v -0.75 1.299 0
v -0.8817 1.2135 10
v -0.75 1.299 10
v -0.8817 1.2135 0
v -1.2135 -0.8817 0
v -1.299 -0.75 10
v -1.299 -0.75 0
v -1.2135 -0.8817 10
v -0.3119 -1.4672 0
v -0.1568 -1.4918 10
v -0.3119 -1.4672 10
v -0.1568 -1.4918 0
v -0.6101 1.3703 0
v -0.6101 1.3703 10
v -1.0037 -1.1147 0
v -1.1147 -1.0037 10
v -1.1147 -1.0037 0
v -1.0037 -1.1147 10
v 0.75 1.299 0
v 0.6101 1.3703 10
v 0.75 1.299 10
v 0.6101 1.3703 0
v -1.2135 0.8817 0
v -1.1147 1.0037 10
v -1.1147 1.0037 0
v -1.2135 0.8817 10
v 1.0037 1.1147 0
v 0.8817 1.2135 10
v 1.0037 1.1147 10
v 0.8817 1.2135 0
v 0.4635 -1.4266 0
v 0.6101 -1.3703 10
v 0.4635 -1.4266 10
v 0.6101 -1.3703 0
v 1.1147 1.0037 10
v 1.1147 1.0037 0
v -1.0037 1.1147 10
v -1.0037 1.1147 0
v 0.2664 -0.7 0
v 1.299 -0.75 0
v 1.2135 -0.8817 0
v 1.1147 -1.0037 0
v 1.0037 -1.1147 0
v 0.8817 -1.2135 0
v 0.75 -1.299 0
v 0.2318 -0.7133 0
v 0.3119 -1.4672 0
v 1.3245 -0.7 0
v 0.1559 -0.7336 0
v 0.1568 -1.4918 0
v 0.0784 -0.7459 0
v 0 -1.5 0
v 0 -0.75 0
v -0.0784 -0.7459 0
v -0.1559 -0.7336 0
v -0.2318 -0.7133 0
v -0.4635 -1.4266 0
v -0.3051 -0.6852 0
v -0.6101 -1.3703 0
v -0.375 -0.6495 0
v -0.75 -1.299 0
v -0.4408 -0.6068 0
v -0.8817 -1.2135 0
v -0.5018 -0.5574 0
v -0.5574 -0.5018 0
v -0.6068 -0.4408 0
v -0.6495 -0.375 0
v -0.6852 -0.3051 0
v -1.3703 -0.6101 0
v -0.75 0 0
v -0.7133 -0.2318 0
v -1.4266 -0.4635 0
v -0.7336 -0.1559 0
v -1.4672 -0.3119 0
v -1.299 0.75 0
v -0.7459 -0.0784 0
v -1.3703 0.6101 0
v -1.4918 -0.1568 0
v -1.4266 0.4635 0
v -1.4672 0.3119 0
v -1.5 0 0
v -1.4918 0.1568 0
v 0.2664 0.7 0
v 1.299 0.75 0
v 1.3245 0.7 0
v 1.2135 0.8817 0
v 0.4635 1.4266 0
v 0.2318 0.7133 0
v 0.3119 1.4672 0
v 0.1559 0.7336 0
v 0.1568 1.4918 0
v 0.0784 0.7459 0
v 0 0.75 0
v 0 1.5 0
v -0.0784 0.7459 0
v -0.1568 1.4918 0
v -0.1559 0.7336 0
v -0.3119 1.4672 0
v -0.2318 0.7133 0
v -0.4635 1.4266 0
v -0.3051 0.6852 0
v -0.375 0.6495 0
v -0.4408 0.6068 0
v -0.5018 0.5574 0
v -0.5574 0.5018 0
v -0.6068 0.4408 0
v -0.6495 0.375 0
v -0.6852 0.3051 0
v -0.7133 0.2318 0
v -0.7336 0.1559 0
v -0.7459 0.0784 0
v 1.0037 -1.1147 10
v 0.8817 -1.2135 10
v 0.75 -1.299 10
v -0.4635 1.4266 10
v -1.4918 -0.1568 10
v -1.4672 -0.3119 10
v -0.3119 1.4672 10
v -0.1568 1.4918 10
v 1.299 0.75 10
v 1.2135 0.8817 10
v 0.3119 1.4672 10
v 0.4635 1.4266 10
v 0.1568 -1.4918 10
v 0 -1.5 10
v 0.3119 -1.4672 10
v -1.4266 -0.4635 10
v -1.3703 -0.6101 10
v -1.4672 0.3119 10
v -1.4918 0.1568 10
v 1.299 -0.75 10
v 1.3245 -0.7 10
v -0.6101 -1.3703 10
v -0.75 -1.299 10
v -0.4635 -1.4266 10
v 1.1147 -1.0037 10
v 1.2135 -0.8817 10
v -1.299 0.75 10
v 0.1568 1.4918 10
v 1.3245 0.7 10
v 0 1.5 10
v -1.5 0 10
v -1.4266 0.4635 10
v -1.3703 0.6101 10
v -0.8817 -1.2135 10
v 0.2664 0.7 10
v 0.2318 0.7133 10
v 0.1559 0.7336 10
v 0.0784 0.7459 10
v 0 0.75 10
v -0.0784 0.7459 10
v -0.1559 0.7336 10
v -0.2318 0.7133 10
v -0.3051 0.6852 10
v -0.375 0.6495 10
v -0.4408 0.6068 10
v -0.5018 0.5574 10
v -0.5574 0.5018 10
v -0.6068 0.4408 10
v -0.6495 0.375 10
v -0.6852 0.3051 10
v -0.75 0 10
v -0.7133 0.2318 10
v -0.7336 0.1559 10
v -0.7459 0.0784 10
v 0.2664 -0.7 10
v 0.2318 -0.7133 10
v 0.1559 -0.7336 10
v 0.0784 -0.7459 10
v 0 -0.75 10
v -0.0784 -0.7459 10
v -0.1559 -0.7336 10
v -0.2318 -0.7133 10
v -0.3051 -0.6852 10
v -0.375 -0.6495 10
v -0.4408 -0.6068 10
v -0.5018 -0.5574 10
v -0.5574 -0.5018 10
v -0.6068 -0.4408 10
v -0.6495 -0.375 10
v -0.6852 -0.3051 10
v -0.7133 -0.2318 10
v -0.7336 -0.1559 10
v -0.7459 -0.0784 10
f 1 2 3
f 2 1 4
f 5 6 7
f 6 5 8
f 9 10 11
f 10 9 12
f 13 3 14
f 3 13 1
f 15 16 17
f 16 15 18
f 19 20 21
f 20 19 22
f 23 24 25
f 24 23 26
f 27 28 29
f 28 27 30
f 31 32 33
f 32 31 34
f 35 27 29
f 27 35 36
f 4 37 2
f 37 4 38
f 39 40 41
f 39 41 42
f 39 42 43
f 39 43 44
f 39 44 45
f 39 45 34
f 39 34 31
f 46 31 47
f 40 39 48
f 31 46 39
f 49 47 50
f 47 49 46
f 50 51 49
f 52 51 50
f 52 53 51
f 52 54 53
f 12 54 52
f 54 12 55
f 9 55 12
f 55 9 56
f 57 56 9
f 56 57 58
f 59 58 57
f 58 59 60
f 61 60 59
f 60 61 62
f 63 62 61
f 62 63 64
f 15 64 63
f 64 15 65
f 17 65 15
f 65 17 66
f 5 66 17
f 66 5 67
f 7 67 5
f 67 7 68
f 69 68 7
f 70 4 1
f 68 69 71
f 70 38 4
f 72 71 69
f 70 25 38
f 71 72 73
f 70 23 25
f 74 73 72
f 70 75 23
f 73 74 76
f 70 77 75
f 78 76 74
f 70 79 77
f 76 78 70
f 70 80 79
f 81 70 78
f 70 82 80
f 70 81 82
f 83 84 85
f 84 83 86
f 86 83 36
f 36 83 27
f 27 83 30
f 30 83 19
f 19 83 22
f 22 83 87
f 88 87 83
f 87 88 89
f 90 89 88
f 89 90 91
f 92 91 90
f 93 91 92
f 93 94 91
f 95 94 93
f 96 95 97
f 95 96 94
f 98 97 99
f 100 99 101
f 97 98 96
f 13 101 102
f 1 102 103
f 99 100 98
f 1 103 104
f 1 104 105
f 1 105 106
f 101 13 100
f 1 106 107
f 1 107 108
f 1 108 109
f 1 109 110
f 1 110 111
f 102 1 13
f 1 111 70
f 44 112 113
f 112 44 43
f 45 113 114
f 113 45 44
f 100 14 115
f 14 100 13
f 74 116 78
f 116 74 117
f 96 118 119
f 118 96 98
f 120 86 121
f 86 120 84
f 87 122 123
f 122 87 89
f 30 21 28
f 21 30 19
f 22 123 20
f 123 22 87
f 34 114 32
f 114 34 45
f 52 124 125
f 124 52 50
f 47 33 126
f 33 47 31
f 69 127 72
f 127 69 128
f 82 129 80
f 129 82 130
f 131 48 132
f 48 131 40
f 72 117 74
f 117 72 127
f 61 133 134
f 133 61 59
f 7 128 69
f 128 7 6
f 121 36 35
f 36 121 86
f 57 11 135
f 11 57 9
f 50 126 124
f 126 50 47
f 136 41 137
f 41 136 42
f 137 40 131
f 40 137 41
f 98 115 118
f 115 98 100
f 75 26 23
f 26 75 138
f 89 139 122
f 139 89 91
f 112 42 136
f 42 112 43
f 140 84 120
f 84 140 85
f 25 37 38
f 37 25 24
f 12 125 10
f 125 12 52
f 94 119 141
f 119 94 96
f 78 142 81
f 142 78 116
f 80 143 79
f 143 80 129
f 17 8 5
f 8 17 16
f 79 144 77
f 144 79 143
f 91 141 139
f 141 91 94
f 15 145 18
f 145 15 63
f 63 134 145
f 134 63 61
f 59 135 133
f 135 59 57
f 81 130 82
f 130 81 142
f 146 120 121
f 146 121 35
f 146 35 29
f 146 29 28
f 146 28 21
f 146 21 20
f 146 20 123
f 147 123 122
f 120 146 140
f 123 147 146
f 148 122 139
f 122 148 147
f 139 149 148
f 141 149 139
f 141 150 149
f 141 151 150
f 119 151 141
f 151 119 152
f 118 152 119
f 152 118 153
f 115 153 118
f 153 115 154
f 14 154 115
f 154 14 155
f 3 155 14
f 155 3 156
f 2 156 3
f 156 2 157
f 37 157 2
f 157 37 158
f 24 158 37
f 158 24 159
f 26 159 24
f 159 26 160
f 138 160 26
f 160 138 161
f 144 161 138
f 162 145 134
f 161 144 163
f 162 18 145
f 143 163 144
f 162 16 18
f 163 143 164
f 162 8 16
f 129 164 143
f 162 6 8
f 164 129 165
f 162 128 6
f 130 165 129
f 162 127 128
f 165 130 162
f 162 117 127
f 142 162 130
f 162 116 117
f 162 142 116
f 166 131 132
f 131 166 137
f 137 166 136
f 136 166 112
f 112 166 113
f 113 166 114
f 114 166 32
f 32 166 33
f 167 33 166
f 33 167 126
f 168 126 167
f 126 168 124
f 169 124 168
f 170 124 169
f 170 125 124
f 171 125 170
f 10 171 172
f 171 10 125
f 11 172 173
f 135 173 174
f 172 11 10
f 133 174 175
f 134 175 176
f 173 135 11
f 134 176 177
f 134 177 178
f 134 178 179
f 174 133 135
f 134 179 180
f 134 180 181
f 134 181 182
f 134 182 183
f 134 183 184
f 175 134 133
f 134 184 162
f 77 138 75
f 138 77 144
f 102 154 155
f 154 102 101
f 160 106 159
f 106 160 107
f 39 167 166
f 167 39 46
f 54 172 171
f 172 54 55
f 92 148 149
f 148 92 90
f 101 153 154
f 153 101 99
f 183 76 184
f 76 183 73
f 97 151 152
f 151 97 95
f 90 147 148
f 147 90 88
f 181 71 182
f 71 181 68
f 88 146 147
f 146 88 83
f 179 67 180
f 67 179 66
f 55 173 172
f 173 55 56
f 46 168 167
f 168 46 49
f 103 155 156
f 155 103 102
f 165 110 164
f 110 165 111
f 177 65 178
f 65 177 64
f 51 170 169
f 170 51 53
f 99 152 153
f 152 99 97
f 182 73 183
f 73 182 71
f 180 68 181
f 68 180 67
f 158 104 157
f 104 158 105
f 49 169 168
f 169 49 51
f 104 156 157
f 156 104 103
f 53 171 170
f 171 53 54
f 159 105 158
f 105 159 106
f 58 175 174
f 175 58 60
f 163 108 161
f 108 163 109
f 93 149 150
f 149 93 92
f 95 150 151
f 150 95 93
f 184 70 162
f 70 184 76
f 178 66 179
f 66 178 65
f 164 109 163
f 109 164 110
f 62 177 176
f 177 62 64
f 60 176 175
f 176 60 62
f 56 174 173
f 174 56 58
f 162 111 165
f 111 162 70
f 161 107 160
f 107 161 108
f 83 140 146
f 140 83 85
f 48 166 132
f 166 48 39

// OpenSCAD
// Slotted roll pin.
$fn = 60;
eps = 0.02;
inner_d = 1.5;
outer_d = 3;
length = 10;
slot = 1.4;
difference() {
    cylinder(d=outer_d,h=length);
    translate([0,0,-eps]) cylinder(d=inner_d,h=length+2*eps);
    translate([0,-slot/2,-eps]) cube([outer_d/2+eps,slot,length+2*eps]);
}
